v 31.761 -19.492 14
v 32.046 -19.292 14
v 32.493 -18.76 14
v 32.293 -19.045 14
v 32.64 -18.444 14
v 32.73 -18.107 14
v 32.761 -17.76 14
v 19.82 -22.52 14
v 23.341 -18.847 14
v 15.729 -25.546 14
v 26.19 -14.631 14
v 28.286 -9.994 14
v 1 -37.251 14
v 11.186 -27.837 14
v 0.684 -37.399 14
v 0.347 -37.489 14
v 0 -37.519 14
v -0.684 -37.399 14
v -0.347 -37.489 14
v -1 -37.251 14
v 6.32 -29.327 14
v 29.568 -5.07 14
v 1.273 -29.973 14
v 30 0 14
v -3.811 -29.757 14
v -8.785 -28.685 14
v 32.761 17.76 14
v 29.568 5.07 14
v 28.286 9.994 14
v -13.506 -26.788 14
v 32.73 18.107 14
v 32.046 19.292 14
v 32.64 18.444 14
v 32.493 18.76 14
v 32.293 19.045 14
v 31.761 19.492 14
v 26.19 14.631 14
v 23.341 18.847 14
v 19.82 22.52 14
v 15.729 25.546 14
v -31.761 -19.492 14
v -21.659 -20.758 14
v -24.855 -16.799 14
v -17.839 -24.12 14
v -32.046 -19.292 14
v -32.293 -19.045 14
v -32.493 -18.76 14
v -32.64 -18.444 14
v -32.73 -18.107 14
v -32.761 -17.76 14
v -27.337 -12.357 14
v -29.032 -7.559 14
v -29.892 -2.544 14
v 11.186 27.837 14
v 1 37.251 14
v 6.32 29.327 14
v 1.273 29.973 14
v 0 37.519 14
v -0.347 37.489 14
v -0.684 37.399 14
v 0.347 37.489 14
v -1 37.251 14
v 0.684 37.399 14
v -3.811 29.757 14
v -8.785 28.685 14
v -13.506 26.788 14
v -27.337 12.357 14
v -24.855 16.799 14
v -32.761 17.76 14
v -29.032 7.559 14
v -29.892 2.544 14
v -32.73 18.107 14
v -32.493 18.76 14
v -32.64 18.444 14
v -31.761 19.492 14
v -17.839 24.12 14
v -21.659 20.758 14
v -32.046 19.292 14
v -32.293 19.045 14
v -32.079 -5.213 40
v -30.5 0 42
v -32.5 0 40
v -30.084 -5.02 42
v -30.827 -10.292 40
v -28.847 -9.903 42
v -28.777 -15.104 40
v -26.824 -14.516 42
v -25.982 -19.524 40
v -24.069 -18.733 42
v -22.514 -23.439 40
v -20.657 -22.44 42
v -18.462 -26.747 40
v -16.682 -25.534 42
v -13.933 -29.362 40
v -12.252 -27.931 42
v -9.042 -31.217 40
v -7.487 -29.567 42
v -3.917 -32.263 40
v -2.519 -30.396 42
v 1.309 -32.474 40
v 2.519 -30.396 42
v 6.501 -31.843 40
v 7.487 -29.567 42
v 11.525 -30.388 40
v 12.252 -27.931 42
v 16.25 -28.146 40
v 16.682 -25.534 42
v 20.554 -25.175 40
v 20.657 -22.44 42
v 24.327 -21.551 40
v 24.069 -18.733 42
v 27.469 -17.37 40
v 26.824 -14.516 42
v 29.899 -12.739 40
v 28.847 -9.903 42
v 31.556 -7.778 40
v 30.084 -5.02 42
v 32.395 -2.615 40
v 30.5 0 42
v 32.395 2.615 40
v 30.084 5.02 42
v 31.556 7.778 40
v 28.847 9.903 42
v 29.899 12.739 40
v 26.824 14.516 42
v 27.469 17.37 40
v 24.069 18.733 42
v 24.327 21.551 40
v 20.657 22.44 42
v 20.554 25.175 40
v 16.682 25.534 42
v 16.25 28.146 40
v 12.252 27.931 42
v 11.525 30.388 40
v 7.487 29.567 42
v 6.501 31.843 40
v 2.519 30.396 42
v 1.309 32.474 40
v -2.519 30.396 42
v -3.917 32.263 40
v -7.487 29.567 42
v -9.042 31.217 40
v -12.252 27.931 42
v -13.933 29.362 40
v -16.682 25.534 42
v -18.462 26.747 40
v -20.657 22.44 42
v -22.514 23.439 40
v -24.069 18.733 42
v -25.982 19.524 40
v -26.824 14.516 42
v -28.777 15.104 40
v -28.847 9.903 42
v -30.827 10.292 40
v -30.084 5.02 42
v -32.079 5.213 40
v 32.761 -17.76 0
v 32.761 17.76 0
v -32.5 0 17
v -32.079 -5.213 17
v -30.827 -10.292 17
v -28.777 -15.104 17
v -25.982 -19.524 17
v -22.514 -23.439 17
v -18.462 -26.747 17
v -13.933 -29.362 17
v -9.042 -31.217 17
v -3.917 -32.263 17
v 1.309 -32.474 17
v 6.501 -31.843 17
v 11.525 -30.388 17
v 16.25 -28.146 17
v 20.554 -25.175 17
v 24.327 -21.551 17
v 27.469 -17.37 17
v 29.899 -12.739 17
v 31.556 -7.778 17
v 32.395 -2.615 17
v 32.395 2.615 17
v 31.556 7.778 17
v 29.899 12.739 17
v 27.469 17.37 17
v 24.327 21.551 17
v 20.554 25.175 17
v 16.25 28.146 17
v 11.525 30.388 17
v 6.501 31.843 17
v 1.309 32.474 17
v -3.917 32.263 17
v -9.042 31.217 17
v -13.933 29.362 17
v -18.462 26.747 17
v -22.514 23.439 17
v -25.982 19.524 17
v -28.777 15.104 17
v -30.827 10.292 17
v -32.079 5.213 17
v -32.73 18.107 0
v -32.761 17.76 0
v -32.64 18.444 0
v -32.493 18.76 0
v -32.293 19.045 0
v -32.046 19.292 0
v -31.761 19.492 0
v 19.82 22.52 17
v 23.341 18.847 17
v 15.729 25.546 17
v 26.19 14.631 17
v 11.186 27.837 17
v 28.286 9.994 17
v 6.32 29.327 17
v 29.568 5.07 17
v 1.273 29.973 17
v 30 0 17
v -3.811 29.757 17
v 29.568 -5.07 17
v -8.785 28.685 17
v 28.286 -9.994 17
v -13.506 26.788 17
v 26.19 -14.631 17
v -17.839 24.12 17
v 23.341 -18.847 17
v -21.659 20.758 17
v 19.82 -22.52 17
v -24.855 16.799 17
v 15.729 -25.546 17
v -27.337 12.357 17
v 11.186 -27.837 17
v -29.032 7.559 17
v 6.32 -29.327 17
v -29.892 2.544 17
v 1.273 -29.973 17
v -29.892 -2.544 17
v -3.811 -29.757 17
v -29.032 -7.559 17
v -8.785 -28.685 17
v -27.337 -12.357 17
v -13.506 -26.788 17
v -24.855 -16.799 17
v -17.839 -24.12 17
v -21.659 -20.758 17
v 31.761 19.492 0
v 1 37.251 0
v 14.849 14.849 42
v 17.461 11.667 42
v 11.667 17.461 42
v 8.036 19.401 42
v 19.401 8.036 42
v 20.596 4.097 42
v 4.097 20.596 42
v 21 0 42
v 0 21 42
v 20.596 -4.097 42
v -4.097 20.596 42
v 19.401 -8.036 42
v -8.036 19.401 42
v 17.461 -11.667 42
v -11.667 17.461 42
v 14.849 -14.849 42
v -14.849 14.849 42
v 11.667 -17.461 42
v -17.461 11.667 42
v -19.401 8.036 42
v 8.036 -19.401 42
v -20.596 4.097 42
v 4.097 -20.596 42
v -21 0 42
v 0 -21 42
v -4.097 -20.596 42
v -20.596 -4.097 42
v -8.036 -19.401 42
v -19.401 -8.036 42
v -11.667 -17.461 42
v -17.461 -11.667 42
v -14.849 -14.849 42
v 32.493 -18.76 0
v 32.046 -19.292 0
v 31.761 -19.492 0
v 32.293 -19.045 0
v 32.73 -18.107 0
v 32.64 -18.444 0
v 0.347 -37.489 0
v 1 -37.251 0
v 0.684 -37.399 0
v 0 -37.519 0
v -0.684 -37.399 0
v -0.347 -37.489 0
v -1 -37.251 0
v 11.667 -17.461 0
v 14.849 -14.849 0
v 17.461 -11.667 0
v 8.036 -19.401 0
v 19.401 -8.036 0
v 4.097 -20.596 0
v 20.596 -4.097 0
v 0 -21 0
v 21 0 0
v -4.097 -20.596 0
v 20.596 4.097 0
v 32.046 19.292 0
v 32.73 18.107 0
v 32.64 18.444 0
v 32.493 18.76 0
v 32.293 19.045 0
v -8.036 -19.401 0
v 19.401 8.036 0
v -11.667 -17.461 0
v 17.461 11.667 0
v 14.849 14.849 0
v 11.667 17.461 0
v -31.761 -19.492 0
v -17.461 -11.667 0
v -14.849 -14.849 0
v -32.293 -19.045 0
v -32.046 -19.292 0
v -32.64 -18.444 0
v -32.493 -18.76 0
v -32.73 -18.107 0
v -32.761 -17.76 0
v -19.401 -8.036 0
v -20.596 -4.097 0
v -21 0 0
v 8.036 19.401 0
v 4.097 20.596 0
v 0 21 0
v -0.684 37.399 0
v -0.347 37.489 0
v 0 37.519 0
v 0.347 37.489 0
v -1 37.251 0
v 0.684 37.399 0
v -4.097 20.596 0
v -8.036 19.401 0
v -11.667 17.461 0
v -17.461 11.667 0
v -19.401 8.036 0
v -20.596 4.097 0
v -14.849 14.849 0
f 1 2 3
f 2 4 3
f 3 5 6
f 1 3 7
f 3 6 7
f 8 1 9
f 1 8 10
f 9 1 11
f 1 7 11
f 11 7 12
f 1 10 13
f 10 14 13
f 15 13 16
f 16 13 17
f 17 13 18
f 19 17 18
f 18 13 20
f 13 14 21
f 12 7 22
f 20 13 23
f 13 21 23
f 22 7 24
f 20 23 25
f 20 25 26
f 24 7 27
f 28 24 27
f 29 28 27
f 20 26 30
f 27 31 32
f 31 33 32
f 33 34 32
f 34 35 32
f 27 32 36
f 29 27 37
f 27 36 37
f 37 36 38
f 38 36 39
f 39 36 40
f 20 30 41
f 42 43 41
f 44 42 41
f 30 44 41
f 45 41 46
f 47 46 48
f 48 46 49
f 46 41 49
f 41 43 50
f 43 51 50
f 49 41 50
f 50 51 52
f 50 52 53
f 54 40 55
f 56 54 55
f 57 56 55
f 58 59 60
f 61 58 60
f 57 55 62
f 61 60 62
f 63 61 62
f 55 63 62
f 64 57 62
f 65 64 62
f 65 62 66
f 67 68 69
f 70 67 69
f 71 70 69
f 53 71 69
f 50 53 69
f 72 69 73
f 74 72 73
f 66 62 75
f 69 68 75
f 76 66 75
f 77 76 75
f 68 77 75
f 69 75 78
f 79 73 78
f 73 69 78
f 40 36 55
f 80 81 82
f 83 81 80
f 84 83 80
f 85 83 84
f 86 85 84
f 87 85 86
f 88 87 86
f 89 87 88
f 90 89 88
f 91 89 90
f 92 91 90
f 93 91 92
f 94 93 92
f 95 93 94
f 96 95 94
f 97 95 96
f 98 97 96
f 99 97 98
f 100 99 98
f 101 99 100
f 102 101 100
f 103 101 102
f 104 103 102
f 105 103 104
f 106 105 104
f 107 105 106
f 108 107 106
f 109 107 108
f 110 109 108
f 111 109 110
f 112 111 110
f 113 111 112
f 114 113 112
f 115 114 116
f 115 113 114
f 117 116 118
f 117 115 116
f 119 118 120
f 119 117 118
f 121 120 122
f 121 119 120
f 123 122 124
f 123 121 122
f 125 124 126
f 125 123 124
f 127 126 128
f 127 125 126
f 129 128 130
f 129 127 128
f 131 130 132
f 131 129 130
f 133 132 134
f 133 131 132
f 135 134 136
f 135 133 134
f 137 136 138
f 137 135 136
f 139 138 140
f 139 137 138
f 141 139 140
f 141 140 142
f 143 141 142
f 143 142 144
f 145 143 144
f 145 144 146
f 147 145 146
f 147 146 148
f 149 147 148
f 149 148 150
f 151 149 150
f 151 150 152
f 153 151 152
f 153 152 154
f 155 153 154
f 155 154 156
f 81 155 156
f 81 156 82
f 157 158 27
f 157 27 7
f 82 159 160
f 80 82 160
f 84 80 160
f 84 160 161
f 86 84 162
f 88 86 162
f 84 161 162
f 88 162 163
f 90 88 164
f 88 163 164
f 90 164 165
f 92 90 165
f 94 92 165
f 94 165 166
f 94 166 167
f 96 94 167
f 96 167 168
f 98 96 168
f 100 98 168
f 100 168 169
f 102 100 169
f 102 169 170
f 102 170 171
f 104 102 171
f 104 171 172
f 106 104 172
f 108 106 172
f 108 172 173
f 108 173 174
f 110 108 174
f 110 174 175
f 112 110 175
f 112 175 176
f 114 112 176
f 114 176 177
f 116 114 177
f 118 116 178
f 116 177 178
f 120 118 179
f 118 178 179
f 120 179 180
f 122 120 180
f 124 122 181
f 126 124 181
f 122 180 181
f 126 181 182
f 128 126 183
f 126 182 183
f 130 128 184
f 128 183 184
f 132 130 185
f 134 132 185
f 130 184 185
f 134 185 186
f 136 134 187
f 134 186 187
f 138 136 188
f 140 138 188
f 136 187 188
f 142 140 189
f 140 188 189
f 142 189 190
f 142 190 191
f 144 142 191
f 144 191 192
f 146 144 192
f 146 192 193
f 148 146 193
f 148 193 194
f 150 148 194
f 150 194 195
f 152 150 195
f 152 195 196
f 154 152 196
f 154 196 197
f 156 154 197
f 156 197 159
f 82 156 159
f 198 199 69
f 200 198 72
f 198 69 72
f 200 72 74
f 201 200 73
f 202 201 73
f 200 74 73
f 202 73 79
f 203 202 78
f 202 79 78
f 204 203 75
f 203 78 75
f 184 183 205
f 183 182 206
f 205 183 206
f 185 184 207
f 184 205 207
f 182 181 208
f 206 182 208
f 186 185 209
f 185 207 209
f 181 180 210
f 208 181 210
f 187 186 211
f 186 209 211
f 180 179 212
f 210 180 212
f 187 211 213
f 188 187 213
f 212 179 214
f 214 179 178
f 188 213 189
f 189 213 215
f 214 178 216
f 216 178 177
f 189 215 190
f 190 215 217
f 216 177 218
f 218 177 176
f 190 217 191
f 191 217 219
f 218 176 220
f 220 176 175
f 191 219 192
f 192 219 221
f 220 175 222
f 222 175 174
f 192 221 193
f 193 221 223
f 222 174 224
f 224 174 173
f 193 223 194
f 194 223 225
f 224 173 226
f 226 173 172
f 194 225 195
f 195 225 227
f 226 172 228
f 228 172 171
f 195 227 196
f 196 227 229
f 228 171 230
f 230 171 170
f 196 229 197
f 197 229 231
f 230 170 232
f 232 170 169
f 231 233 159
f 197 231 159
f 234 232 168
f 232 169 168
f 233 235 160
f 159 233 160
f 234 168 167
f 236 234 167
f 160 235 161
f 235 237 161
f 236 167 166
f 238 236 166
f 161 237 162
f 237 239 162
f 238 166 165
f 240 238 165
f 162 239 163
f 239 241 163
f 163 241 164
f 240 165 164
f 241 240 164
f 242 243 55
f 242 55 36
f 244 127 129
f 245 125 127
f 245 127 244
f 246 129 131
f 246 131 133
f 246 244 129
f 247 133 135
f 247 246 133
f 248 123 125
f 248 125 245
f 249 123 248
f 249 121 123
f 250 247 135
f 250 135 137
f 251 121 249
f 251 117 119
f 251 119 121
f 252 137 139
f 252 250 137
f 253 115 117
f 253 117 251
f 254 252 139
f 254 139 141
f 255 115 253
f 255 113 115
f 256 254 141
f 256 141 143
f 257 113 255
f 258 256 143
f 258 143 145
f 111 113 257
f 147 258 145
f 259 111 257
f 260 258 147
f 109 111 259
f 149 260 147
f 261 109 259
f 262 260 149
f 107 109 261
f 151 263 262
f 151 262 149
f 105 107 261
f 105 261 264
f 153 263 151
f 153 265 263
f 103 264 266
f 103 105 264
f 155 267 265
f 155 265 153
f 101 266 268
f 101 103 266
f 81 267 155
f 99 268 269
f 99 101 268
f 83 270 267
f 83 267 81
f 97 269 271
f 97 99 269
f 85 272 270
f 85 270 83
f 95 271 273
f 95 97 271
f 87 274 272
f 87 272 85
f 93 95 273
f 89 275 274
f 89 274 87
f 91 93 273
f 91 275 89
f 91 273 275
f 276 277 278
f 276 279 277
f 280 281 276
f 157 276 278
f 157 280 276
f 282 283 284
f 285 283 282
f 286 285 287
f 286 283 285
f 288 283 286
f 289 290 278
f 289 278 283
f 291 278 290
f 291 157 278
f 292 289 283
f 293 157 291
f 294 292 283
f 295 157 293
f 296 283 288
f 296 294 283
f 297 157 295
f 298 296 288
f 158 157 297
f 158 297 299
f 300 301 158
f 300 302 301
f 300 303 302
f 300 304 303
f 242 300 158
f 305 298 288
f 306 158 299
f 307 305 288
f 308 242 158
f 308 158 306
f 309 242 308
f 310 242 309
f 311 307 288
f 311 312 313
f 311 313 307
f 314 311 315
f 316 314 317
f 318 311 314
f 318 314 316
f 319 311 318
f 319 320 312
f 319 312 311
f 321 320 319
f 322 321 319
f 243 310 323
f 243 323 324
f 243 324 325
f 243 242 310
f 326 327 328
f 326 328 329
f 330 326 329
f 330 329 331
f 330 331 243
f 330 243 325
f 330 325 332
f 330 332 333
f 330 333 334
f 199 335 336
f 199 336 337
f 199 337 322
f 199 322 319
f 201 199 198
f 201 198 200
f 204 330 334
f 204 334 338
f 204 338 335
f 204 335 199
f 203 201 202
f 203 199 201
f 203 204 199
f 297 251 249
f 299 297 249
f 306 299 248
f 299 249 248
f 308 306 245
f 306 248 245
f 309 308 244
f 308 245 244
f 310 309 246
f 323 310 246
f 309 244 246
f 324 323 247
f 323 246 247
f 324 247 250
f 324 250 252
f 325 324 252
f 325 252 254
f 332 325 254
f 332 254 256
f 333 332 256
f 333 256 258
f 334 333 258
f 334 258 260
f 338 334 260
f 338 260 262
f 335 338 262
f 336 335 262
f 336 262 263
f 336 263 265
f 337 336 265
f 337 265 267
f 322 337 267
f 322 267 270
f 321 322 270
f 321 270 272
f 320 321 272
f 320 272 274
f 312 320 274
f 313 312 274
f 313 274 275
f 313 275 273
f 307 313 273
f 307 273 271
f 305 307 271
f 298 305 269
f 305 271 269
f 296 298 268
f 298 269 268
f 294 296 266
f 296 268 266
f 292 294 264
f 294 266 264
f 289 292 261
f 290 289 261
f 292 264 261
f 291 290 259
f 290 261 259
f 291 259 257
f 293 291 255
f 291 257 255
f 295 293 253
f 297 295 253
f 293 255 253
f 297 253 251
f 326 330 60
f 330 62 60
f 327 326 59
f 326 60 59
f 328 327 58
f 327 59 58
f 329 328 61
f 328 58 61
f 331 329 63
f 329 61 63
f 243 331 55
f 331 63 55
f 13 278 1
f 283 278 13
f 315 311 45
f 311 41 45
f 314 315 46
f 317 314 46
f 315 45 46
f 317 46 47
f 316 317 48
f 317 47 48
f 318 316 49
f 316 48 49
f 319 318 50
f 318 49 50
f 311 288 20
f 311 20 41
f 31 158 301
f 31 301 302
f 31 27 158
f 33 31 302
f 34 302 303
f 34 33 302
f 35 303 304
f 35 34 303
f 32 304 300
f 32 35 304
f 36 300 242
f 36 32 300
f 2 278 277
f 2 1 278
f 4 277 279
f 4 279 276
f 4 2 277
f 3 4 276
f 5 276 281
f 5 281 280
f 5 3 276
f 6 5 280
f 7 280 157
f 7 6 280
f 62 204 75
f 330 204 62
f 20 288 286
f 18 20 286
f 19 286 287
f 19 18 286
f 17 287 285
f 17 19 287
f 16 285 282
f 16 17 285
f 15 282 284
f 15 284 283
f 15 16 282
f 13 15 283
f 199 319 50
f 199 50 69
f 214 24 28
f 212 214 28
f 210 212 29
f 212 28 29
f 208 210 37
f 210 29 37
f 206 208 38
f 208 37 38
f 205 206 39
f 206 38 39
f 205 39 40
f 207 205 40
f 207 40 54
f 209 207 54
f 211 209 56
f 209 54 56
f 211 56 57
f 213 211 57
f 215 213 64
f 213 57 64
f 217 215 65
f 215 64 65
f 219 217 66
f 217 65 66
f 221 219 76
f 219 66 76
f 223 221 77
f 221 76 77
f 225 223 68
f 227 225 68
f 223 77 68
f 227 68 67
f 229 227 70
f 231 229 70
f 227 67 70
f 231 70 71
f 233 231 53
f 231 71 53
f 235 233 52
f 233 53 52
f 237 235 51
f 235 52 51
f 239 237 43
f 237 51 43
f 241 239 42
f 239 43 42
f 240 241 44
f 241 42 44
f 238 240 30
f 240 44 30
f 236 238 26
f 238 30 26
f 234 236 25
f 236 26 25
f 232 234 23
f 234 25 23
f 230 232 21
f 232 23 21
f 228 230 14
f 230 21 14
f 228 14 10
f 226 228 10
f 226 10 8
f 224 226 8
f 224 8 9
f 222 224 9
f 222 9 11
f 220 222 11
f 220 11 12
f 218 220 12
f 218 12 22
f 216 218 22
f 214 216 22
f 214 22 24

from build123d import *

# Parameters (mm, degrees)
SKETCH1_R           = 32.5
BOSS_EXTRUDE1_DEPTH = 42
CUT_EXTRUDE1_START  = -28
SKETCH2_R           = 32.5
SKETCH2_R_2         = 30
CUT_EXTRUDE1_DEPTH  = 3
BOSS_EXTRUDE2_DEPTH = 14
FILLET1_R           = 2
CHAMFER1_SIZE       = 2
SKETCH4_R           = 21
CUT_EXTRUDE3_DEPTH  = 66.153392256


with BuildPart() as part:
    # Sketch1 → Boss-Extrude1 (new body)
    with BuildSketch(Plane.XY):
        with Locations(Location((0, 0, 0), (0, 0, 180))):
            Circle(SKETCH1_R)
    extrude(amount=BOSS_EXTRUDE1_DEPTH)

    # Sketch2 → Cut-Extrude1 (cut)
    with BuildSketch(Plane.XY.offset(42).offset(CUT_EXTRUDE1_START)):
        with Locations(Location((0, 0, 0), (0, 0, 180))):
            Circle(SKETCH2_R)
        Circle(SKETCH2_R_2, mode=Mode.SUBTRACT)
    extrude(amount=CUT_EXTRUDE1_DEPTH, mode=Mode.SUBTRACT)

    # Sketch3 → Boss-Extrude2 (add)
    with BuildSketch(Plane(origin=(0, 0, 0), x_dir=(-1, 0, 0), z_dir=(0, 0, -1))):
        Polygon((0, -37.828766952), (32.760673174, -18.914383476), (32.760673174, 18.914383476), (0, 37.828766952), (-32.760673174, 18.914383476), (-32.760673174, -18.914383476), align=None)
    extrude(amount=-BOSS_EXTRUDE2_DEPTH)

    # Fillet1
    fillet1_edges = [part.edges().sort_by_distance(p)[0] for p in [
        (0, -37.828766952, 7),
        (32.760673174, -18.914383476, 7),
        (32.760673174, 18.914383476, 7),
        (0, 37.828766952, 7),
        (-32.760673174, 18.914383476, 7),
        (-32.760673174, -18.914383476, 7),
    ]]
    fillet(fillet1_edges, radius=FILLET1_R)

    # Chamfer1
    chamfer1_edges = [part.edges().sort_by_distance(p)[0] for p in [
        (32.5, 0, 42),
    ]]
    chamfer(chamfer1_edges, length=CHAMFER1_SIZE)

    # Sketch4 → Cut-Extrude3 (cut, through all)
    with BuildSketch(Plane.XY.offset(42)):
        Circle(SKETCH4_R)
    extrude(amount=-CUT_EXTRUDE3_DEPTH, mode=Mode.SUBTRACT)


solid = part.part
